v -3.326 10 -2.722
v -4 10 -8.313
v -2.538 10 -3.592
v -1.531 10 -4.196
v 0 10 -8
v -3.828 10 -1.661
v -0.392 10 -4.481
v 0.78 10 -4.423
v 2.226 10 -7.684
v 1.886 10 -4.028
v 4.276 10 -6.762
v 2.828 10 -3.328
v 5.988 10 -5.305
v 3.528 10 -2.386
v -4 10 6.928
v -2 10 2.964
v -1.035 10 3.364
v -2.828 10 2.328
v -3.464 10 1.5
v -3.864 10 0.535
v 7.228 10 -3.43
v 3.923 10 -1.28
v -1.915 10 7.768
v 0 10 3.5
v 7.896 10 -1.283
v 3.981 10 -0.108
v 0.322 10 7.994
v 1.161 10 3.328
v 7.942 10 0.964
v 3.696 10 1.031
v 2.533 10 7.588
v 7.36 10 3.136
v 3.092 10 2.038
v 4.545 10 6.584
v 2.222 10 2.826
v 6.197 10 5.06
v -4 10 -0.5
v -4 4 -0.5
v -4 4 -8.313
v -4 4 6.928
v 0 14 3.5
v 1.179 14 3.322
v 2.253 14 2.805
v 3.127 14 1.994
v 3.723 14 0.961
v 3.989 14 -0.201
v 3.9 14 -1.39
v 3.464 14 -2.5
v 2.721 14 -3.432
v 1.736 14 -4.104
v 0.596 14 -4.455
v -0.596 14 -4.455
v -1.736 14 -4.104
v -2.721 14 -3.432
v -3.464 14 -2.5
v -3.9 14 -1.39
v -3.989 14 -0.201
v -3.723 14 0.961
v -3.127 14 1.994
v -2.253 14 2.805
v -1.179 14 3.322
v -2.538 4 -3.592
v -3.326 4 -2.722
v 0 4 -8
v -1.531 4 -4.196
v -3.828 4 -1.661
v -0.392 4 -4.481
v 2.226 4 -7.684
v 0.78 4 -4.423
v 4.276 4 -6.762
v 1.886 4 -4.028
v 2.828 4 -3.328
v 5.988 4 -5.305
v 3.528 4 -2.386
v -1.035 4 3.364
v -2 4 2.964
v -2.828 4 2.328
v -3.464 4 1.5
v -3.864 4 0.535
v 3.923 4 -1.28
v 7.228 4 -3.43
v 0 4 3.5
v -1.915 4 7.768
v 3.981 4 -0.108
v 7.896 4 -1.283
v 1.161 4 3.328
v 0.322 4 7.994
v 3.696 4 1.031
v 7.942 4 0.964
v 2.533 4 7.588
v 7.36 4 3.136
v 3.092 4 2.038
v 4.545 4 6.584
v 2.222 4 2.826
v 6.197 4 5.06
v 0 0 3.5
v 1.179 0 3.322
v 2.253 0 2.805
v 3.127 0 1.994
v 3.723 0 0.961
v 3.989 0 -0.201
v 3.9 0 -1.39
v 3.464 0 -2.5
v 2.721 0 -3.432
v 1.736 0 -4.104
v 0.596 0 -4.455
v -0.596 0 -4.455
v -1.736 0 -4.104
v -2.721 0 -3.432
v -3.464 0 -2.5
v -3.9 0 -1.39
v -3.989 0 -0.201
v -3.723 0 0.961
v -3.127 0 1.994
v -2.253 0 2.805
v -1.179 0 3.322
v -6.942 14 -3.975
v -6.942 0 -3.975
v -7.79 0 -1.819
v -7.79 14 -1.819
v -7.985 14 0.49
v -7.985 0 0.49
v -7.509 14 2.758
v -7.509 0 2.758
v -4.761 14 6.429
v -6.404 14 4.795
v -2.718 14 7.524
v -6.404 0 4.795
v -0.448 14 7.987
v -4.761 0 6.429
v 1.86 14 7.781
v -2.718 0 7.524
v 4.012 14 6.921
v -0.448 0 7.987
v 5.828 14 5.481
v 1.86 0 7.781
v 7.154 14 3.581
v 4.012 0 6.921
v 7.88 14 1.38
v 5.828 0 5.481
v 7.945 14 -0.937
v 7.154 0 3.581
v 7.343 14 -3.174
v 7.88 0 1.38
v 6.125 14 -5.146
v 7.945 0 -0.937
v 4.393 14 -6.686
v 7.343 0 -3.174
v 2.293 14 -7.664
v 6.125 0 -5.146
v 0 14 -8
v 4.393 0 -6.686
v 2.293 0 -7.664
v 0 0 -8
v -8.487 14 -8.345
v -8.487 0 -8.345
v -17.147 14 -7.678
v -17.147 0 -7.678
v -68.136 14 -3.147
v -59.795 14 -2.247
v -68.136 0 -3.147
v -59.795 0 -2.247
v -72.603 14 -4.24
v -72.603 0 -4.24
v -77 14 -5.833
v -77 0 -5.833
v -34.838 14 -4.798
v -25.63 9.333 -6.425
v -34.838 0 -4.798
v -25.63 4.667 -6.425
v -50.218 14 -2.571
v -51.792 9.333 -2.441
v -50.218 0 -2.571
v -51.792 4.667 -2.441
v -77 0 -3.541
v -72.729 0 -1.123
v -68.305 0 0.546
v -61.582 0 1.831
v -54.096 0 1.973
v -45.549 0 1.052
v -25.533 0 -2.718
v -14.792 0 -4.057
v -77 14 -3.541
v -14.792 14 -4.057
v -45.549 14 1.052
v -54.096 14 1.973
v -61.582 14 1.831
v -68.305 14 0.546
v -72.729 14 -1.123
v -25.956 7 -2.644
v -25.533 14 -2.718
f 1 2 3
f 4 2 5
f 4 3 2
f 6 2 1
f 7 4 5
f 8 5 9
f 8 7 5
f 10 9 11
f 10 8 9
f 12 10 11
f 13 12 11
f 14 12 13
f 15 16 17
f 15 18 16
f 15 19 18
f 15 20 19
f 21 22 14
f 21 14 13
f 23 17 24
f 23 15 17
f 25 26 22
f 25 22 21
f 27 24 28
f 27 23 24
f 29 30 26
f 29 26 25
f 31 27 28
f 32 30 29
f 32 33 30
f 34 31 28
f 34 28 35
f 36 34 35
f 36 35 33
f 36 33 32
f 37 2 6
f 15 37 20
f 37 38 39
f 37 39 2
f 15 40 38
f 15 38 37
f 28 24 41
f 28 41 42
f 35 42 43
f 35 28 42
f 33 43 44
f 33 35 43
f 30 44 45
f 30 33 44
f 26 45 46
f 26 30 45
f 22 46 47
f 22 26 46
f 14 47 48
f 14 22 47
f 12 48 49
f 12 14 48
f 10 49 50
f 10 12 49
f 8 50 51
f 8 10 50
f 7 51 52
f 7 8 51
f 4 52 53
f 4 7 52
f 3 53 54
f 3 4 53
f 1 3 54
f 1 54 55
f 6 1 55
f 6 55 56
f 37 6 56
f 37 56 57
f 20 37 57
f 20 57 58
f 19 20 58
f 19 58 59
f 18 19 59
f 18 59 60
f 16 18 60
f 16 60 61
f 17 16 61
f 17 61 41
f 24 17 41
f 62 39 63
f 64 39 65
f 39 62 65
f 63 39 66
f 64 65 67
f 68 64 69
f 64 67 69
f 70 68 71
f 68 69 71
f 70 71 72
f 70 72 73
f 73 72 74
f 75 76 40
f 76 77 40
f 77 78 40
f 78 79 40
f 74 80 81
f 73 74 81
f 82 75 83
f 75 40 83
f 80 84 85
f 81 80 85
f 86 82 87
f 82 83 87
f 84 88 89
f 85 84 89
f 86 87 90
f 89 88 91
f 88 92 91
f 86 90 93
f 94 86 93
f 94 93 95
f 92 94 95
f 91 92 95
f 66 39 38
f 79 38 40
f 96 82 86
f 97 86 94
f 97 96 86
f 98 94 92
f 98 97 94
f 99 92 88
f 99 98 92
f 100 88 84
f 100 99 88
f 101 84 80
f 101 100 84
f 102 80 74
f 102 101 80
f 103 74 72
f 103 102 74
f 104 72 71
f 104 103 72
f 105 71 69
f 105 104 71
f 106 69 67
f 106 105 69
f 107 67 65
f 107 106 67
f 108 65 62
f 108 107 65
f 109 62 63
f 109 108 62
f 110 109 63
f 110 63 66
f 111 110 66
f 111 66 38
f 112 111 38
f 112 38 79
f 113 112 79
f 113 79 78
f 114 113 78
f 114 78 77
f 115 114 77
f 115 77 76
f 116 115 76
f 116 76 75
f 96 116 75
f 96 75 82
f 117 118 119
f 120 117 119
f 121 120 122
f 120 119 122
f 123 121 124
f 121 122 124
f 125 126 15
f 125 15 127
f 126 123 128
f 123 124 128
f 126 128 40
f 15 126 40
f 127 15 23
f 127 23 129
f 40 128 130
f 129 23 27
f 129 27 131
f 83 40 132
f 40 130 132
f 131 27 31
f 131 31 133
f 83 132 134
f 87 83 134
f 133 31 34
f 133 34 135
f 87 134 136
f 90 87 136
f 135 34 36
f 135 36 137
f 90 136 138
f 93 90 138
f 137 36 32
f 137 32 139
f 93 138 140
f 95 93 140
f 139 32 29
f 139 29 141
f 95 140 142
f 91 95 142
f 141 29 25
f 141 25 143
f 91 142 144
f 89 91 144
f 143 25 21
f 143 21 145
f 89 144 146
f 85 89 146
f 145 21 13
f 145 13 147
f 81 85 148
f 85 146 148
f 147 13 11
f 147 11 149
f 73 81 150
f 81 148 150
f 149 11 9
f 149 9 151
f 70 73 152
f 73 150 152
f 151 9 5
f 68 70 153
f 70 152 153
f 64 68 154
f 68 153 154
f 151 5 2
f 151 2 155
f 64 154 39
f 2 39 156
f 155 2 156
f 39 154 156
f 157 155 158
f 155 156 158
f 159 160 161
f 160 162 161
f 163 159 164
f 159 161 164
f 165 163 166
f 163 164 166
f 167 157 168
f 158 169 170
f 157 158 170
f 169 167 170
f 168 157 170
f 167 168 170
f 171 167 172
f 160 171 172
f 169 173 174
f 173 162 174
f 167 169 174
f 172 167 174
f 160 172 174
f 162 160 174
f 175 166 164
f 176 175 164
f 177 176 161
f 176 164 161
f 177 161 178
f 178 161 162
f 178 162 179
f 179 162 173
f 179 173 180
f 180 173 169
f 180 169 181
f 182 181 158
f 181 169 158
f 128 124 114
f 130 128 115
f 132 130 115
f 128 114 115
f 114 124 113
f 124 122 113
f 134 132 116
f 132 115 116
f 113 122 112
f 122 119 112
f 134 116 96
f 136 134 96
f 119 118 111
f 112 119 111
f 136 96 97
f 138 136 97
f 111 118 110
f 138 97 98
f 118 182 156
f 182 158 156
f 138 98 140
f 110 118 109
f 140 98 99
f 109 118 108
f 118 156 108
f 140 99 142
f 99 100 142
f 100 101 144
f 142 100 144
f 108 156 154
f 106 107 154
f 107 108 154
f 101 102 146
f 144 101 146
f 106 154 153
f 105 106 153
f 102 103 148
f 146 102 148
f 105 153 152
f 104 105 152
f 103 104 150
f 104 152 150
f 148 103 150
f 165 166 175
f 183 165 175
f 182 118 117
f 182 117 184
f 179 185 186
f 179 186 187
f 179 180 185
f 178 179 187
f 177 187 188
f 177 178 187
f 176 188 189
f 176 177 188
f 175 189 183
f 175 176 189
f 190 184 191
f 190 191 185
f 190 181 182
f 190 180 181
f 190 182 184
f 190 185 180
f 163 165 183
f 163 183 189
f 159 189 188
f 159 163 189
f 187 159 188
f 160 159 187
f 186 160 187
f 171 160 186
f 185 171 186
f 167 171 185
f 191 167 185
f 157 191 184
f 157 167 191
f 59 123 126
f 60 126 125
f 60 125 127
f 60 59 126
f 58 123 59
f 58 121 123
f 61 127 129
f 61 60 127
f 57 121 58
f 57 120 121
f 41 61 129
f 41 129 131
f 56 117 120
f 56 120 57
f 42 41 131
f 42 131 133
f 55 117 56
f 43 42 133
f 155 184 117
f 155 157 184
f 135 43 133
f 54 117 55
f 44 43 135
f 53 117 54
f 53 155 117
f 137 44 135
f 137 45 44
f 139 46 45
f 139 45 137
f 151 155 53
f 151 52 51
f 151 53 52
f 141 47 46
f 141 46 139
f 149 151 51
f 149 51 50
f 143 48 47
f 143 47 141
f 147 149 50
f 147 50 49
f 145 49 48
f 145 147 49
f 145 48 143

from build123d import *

# Parameters (mm, degrees)
SKETCH1_R           = 4
BOSS_EXTRUDE1_DEPTH = 14
SKETCH2_W           = 12
SKETCH2_H           = 6
CUT_EXTRUDE1_DEPTH  = 17


with BuildPart() as part:
    # Sketch1 → Boss-Extrude1 (new body)
    with BuildSketch(Plane(origin=(0, 0, 0), x_dir=(1, 0, 0), z_dir=(0, 1, 0))):
        with BuildLine():
            Line((-76.999999986, 5.832514168), (-76.999999986, 3.540882964))
            add(Edge.make_bspline(
                [(-6.942295947, 3.975490785), (-13.088937843, 4.53703129), (-37.064176348, 1.721893834), (-62.004711992, -6.566542107), (-76.999999986, 3.540882964)],
                knots=[0.045717223, 0.045717223, 0.045717223, 0.045717223, 0.30042167, 1, 1, 1, 1], degree=3))
            ThreePointArc((-6.942295947, 3.975490785), (4.012235893, -6.921124413), (0, 8))
            add(Edge.make_bspline(
                [(0, 8), (-24.867463869, 10.892678598), (-52.765963903, -4.510038737), (-76.999999986, 5.832514168)],
                knots=[0, 0, 0, 0, 1, 1, 1, 1], degree=3))
        make_face()
        with Locations(Location((0, 0.5, 0), (0, 0, 270))):
            Circle(SKETCH1_R, mode=Mode.SUBTRACT)
    extrude(amount=BOSS_EXTRUDE1_DEPTH)

    # Sketch2 → Cut-Extrude1 (cut, symmetric)
    with BuildSketch(Plane.XY):
        with Locations((2, 7)):
            Rectangle(SKETCH2_W, SKETCH2_H)
    extrude(amount=CUT_EXTRUDE1_DEPTH, both=True, mode=Mode.SUBTRACT)


solid = part.part
